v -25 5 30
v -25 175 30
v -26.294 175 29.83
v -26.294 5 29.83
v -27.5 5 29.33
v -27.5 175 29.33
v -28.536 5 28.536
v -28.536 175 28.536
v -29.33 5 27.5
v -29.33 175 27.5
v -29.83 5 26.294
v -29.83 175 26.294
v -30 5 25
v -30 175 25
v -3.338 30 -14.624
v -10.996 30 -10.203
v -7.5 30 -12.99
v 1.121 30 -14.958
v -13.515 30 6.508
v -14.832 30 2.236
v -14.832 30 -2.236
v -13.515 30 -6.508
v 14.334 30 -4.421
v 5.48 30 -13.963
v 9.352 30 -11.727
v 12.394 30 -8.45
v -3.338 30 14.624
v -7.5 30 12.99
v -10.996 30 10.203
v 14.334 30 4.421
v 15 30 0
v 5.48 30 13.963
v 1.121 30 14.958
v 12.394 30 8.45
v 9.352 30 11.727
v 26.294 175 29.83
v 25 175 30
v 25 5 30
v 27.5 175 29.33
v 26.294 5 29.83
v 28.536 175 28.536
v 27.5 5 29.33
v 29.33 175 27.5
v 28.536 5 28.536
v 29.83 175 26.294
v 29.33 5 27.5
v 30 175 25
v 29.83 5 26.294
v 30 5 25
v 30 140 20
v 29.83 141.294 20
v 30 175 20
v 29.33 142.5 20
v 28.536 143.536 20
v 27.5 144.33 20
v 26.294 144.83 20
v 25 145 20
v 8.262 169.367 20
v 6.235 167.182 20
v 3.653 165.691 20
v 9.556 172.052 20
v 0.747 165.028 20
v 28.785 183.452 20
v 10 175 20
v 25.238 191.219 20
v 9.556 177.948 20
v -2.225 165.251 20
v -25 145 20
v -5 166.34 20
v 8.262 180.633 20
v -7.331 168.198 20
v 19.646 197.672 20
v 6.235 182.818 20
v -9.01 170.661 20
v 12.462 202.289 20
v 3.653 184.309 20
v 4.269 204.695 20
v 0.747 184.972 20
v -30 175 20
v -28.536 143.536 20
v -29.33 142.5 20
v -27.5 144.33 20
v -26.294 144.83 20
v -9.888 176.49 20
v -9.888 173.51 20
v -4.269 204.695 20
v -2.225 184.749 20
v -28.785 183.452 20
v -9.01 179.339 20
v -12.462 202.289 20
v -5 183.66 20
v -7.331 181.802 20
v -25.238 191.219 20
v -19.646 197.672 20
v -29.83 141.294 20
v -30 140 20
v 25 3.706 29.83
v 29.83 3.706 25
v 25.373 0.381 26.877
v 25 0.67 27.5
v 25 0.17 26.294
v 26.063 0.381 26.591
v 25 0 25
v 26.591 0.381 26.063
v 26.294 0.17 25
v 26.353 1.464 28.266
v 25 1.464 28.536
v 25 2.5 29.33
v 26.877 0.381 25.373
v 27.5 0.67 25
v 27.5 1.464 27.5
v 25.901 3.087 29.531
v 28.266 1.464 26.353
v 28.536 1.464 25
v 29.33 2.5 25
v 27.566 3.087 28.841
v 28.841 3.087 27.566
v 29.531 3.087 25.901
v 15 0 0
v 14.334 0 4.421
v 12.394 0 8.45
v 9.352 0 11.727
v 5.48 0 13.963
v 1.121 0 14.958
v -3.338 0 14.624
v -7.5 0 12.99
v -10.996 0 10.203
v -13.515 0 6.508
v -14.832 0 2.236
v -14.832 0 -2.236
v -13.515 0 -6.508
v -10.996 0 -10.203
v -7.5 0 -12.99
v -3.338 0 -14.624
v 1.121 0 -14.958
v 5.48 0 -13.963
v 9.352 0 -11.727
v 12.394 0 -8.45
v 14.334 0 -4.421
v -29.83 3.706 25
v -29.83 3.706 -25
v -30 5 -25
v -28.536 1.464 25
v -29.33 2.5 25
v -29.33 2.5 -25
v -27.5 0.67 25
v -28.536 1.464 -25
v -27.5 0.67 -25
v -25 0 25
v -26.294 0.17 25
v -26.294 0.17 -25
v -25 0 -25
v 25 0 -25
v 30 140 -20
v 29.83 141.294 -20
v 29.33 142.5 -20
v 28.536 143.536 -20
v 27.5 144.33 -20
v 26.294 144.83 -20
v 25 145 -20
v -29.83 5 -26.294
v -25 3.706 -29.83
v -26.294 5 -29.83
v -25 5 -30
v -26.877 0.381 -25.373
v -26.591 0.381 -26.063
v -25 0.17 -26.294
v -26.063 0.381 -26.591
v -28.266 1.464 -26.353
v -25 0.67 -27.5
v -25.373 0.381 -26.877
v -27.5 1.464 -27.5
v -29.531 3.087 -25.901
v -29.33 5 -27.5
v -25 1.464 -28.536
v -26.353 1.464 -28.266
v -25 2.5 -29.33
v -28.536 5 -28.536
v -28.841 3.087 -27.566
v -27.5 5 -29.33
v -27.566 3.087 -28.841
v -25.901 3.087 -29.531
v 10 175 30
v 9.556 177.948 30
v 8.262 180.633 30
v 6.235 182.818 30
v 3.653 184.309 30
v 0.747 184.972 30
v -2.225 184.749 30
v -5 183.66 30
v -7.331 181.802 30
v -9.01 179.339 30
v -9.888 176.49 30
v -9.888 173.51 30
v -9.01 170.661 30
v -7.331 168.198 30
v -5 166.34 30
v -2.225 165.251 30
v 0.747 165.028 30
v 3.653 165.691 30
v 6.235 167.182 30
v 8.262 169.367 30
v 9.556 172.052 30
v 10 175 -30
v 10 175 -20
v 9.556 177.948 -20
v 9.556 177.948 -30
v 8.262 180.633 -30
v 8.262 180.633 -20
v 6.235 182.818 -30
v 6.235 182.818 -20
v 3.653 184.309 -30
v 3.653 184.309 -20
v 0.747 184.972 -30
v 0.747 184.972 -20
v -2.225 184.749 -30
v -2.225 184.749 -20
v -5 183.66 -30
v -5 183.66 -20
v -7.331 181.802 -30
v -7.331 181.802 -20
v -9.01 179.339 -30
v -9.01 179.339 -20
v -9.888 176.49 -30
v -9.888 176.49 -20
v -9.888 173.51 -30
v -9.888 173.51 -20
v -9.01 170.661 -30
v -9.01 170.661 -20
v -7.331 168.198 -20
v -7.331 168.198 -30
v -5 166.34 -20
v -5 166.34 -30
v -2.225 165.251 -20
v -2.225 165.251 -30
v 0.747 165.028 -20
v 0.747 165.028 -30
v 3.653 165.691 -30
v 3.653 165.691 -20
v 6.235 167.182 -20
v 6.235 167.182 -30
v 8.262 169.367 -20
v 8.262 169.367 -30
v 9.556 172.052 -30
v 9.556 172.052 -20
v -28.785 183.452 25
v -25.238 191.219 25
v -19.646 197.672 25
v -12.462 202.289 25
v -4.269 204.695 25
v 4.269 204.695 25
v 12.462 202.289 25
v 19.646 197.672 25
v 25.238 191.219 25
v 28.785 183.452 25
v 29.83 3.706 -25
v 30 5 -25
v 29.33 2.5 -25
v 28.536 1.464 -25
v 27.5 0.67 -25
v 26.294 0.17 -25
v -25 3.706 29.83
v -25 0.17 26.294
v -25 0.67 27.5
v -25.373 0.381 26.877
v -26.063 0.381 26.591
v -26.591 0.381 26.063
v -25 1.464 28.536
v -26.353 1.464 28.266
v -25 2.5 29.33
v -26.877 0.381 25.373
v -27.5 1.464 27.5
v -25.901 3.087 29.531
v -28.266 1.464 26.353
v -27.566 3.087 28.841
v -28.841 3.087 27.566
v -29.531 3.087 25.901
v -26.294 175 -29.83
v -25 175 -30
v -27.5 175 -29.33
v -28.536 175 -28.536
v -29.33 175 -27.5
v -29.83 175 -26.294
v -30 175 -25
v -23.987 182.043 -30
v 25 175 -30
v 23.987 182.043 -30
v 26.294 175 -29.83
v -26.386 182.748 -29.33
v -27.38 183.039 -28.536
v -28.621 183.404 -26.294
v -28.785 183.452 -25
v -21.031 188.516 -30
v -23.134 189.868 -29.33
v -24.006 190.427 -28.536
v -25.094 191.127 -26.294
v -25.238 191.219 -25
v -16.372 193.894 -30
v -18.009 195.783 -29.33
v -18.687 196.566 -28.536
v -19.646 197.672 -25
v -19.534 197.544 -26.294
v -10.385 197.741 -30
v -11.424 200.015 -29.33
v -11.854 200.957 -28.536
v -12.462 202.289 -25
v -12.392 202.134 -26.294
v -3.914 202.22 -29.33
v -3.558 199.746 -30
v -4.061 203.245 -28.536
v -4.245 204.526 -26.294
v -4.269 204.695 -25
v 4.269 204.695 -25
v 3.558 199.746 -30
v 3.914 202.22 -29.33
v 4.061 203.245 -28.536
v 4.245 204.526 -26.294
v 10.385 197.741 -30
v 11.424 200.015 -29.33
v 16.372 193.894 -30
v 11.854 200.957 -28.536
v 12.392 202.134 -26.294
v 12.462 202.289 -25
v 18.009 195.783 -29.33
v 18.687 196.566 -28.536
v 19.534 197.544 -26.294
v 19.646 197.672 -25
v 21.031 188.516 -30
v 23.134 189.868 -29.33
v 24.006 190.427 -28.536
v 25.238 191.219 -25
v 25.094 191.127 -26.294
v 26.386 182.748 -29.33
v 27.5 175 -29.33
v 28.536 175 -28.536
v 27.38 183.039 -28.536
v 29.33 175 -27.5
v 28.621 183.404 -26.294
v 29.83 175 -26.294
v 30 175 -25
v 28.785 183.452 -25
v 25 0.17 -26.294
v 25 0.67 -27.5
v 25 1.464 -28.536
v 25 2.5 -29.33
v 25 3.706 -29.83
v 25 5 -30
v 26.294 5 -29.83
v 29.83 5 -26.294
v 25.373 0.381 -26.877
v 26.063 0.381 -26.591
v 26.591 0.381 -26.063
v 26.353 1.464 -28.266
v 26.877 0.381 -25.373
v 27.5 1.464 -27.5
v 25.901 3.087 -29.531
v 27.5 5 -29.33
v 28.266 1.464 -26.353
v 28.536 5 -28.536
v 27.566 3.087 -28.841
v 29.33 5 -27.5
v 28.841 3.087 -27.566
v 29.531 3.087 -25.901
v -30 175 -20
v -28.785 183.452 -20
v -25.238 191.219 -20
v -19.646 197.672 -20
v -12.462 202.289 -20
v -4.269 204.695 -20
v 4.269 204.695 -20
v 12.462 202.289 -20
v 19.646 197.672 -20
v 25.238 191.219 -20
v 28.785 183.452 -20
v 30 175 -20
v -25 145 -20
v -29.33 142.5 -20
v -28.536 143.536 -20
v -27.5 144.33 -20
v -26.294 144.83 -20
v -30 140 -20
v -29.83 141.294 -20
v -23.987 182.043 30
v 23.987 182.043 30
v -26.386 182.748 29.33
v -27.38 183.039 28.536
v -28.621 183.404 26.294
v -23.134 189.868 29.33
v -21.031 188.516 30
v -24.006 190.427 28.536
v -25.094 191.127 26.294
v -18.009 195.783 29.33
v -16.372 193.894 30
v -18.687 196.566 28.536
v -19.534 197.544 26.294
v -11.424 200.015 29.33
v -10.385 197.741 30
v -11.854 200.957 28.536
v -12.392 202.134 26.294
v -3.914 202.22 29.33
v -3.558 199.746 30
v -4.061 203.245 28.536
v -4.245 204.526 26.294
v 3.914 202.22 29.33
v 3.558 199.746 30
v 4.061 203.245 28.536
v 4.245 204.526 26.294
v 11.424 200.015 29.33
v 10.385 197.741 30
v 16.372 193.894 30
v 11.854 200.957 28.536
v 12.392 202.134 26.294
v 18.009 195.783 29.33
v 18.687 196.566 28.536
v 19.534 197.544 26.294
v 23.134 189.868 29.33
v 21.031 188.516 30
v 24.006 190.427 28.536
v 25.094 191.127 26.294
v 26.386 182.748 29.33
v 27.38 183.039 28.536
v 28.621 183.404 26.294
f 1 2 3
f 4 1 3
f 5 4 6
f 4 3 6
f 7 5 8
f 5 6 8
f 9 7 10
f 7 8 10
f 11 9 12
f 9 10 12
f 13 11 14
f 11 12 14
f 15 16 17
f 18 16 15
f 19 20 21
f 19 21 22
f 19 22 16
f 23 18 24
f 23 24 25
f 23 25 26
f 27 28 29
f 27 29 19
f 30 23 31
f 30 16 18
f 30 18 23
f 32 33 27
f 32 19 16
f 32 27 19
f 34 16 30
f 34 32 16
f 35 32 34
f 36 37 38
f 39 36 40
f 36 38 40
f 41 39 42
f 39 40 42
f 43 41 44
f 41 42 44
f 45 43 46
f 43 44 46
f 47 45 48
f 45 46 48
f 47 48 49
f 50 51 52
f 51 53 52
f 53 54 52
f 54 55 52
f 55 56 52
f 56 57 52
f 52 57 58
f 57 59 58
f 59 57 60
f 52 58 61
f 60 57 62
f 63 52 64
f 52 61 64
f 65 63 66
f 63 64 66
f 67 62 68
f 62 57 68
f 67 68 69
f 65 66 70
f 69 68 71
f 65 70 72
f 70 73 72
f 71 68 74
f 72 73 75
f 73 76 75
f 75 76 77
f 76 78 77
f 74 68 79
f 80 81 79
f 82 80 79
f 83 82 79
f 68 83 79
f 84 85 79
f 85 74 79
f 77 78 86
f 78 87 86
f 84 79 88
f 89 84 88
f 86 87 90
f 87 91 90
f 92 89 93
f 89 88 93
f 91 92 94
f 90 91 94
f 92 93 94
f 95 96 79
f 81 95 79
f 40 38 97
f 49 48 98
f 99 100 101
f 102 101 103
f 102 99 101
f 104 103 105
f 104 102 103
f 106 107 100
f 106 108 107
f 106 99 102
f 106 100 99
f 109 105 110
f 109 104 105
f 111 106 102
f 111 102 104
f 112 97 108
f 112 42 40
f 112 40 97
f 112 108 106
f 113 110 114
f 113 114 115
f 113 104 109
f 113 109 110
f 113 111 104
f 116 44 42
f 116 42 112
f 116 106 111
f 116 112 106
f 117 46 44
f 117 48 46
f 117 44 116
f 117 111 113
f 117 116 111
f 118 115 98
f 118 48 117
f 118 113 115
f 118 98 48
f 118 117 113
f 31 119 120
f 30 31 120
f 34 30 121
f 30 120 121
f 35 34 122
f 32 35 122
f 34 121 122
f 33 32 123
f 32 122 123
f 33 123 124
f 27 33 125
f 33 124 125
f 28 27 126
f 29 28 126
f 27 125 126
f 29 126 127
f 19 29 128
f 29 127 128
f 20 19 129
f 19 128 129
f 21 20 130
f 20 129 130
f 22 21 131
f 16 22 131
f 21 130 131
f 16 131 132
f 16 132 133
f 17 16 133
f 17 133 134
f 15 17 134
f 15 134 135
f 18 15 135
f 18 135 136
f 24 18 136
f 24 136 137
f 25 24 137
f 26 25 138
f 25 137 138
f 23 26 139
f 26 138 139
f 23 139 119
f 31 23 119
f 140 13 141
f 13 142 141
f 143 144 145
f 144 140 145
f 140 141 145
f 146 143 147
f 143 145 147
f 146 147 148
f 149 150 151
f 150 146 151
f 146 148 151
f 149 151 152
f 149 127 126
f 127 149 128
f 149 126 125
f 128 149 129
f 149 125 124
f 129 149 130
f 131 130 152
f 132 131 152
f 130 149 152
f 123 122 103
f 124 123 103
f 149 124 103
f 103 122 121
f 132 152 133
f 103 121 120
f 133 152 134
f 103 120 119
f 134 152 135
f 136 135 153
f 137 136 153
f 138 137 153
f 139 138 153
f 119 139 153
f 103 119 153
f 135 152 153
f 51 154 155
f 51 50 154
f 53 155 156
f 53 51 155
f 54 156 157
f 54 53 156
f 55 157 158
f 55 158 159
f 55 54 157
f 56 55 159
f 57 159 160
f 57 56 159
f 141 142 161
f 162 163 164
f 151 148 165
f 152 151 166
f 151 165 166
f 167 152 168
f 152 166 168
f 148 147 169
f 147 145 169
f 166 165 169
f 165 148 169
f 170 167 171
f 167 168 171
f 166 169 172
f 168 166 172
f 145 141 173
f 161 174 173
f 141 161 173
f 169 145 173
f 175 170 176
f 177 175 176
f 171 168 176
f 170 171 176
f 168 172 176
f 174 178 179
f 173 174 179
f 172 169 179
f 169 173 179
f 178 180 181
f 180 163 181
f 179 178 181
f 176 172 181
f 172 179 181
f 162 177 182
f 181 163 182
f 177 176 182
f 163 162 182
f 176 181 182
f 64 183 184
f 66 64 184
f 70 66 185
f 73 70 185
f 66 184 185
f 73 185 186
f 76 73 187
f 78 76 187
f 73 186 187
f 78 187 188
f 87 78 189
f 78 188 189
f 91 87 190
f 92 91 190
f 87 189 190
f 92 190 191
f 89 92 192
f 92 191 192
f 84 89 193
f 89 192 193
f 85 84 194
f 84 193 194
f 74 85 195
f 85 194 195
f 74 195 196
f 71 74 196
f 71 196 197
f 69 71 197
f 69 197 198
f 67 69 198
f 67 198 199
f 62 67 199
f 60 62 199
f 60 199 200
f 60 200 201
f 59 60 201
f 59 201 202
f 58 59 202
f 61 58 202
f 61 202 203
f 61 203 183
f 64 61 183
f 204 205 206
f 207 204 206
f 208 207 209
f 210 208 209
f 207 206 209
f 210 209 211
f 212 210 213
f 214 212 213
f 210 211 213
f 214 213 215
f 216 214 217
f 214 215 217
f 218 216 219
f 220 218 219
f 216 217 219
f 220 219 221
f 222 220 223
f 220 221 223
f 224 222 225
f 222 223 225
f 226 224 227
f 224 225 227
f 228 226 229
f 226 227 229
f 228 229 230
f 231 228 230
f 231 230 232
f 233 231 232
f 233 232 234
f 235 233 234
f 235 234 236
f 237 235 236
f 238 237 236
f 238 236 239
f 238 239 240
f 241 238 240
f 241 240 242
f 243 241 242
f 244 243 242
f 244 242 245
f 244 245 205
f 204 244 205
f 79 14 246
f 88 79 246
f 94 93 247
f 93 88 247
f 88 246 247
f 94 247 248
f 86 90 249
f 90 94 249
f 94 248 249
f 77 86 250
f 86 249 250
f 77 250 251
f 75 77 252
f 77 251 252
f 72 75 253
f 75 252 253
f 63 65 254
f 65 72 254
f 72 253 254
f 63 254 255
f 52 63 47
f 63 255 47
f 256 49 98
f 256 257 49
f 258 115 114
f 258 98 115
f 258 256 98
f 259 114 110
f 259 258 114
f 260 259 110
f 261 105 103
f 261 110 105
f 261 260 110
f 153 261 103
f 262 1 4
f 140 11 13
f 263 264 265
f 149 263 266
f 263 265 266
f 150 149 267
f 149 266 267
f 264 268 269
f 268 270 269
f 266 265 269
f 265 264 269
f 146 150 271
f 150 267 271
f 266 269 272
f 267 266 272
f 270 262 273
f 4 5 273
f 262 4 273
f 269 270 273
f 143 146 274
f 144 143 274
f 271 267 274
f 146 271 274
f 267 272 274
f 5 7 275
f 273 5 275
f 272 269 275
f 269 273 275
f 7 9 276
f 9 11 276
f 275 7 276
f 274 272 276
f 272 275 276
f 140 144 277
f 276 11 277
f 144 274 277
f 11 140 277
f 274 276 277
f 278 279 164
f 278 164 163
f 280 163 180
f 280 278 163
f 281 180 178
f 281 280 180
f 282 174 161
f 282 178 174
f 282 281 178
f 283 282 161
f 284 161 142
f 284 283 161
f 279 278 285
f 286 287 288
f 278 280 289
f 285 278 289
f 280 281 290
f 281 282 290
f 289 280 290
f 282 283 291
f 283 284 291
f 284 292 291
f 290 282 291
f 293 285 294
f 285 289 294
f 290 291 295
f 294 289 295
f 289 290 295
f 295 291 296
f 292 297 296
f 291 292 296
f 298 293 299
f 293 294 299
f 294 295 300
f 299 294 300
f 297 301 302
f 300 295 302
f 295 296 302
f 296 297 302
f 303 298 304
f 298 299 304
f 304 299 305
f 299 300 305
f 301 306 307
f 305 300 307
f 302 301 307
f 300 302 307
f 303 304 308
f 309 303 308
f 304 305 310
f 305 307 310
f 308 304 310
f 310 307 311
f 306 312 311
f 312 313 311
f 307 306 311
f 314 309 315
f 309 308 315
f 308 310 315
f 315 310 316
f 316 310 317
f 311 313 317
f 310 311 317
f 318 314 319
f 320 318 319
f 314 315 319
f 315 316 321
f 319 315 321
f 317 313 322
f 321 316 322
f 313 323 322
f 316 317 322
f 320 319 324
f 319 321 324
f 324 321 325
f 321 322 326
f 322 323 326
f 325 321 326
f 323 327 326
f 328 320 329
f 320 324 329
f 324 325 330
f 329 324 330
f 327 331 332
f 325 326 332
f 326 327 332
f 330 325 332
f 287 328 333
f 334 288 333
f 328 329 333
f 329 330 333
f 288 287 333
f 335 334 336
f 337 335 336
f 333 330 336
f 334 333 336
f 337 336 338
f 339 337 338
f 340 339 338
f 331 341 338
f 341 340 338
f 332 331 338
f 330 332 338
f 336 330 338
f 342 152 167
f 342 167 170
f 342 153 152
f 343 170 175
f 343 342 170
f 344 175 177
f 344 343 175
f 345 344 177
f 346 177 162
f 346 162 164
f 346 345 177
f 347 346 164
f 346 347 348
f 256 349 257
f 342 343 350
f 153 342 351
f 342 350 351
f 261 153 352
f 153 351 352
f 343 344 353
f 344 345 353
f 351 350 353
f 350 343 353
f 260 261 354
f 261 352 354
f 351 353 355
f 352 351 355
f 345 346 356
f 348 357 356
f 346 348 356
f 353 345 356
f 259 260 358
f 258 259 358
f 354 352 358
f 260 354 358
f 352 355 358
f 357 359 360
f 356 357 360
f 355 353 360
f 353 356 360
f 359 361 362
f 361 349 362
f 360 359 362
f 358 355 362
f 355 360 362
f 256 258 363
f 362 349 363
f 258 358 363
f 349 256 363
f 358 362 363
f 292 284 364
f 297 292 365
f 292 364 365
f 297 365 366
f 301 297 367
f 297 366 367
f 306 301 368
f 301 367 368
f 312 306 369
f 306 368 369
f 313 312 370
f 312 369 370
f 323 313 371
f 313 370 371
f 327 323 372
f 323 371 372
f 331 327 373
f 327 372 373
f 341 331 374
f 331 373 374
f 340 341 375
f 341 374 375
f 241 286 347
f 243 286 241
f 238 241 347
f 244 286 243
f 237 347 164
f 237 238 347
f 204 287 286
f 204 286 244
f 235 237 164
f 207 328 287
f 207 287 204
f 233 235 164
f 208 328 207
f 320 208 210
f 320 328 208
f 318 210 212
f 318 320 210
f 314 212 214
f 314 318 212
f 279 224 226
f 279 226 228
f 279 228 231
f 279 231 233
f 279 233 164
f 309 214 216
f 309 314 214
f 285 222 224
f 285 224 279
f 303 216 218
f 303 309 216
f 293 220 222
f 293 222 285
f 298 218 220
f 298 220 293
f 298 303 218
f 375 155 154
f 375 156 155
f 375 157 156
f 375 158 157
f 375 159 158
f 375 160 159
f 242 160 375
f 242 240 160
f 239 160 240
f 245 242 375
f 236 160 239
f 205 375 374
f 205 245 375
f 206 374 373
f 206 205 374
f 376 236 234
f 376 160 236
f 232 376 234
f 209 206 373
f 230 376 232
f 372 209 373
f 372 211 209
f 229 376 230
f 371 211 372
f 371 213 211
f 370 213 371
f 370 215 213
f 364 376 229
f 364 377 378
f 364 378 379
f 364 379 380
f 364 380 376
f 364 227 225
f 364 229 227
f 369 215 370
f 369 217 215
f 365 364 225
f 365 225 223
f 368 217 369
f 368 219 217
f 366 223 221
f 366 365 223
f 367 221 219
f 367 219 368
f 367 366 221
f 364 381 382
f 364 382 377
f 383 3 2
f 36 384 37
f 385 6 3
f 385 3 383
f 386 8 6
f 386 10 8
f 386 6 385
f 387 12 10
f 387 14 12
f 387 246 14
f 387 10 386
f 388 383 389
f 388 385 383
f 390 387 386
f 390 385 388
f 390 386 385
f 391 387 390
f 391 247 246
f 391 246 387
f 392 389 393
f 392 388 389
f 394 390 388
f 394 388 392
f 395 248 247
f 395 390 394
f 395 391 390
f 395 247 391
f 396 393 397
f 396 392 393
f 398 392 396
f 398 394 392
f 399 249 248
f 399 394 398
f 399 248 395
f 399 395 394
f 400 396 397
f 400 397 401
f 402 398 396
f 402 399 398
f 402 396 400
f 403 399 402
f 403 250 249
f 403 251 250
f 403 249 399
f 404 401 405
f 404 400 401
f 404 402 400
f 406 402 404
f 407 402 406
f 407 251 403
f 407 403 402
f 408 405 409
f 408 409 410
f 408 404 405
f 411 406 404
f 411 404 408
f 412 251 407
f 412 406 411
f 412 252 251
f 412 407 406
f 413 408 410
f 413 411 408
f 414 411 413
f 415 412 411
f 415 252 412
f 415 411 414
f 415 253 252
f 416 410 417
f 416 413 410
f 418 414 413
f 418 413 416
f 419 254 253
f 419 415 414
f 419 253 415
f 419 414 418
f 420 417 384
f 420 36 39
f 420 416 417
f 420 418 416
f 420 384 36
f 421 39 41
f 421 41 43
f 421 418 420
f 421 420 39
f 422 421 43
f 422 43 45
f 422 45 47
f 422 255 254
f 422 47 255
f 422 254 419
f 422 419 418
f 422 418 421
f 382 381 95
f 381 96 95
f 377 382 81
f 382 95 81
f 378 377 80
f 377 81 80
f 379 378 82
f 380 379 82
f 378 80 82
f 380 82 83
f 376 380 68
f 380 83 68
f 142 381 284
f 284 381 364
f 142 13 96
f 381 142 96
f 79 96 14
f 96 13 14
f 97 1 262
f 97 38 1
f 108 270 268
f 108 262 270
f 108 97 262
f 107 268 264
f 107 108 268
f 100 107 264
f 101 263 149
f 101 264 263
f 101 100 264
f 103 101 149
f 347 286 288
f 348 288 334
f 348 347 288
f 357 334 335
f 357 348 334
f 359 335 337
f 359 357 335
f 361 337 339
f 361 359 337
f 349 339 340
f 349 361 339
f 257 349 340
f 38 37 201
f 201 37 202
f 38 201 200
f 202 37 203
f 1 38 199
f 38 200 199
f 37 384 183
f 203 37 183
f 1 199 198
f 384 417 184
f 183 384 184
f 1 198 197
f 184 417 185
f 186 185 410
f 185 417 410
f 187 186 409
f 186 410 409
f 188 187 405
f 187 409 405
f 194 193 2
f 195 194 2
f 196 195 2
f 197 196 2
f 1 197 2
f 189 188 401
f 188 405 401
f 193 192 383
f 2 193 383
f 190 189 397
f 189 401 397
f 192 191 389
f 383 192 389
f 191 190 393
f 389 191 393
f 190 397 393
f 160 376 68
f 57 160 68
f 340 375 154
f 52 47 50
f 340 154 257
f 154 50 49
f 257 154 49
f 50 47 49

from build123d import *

# Parameters (mm, degrees)
SKETCH_1_W          = 60
SKETCH_1_H          = 60
EXTRUDE_1_DEPTH     = 150
SKETCH_2_R          = 15
CUT_EXTRUDE_1_DEPTH = 30
SKETCH_3_R          = 10
EXTRUDE_2_DEPTH     = 60
SKETCH_4_W          = 40
SKETCH_4_H          = 60
CUT_EXTRUDE_2_DEPTH = 61
FILLET_1_R          = 5


with BuildPart() as part:
    # 草圖1 → 填料-伸長1 (new body)
    with BuildSketch(Plane(origin=(0, 0, 0), x_dir=(1, 0, 0), z_dir=(0, 1, 0))):
        Rectangle(SKETCH_1_W, SKETCH_1_H)
    extrude(amount=EXTRUDE_1_DEPTH)

    # 草圖2 → 除料-伸長1 (cut)
    with BuildSketch(Plane.XZ):
        Circle(SKETCH_2_R)
    extrude(amount=-CUT_EXTRUDE_1_DEPTH, mode=Mode.SUBTRACT)

    # 草圖3 → 填料-伸長2 (add)
    with BuildSketch(Plane.XY.offset(30)):
        with BuildLine():
            Line((-30, 150), (-30, 175))
            ThreePointArc((-30, 175), (0, 205), (30, 175))
            Line((30, 175), (30, 150))
            Line((30, 150), (-30, 150))
        make_face()
        with Locations((0, 175)):
            Circle(SKETCH_3_R, mode=Mode.SUBTRACT)
    extrude(amount=-EXTRUDE_2_DEPTH)

    # 草圖4 → 除料-伸長2 (cut, through all)
    with BuildSketch(Plane.ZY.offset(30)):
        with Locations((0, 175)):
            Rectangle(SKETCH_4_W, SKETCH_4_H)
    extrude(amount=-CUT_EXTRUDE_2_DEPTH, mode=Mode.SUBTRACT)

    # 圓角1
    fillet_1_edges = [part.edges().sort_by_distance(p)[0] for p in [
        (0, 205, 30),
        (0, 205, -30),
        (-30, 145, 0),
        (30, 145, 0),
        (0, 0, 30),
        (-30, 0, 0),
        (0, 0, -30),
        (30, 0, 0),
        (30, 87.5, 30),
        (-30, 87.5, 30),
        (-30, 87.5, -30),
        (30, 87.5, -30),
    ]]
    fillet(fillet_1_edges, radius=FILLET_1_R)


solid = part.part
